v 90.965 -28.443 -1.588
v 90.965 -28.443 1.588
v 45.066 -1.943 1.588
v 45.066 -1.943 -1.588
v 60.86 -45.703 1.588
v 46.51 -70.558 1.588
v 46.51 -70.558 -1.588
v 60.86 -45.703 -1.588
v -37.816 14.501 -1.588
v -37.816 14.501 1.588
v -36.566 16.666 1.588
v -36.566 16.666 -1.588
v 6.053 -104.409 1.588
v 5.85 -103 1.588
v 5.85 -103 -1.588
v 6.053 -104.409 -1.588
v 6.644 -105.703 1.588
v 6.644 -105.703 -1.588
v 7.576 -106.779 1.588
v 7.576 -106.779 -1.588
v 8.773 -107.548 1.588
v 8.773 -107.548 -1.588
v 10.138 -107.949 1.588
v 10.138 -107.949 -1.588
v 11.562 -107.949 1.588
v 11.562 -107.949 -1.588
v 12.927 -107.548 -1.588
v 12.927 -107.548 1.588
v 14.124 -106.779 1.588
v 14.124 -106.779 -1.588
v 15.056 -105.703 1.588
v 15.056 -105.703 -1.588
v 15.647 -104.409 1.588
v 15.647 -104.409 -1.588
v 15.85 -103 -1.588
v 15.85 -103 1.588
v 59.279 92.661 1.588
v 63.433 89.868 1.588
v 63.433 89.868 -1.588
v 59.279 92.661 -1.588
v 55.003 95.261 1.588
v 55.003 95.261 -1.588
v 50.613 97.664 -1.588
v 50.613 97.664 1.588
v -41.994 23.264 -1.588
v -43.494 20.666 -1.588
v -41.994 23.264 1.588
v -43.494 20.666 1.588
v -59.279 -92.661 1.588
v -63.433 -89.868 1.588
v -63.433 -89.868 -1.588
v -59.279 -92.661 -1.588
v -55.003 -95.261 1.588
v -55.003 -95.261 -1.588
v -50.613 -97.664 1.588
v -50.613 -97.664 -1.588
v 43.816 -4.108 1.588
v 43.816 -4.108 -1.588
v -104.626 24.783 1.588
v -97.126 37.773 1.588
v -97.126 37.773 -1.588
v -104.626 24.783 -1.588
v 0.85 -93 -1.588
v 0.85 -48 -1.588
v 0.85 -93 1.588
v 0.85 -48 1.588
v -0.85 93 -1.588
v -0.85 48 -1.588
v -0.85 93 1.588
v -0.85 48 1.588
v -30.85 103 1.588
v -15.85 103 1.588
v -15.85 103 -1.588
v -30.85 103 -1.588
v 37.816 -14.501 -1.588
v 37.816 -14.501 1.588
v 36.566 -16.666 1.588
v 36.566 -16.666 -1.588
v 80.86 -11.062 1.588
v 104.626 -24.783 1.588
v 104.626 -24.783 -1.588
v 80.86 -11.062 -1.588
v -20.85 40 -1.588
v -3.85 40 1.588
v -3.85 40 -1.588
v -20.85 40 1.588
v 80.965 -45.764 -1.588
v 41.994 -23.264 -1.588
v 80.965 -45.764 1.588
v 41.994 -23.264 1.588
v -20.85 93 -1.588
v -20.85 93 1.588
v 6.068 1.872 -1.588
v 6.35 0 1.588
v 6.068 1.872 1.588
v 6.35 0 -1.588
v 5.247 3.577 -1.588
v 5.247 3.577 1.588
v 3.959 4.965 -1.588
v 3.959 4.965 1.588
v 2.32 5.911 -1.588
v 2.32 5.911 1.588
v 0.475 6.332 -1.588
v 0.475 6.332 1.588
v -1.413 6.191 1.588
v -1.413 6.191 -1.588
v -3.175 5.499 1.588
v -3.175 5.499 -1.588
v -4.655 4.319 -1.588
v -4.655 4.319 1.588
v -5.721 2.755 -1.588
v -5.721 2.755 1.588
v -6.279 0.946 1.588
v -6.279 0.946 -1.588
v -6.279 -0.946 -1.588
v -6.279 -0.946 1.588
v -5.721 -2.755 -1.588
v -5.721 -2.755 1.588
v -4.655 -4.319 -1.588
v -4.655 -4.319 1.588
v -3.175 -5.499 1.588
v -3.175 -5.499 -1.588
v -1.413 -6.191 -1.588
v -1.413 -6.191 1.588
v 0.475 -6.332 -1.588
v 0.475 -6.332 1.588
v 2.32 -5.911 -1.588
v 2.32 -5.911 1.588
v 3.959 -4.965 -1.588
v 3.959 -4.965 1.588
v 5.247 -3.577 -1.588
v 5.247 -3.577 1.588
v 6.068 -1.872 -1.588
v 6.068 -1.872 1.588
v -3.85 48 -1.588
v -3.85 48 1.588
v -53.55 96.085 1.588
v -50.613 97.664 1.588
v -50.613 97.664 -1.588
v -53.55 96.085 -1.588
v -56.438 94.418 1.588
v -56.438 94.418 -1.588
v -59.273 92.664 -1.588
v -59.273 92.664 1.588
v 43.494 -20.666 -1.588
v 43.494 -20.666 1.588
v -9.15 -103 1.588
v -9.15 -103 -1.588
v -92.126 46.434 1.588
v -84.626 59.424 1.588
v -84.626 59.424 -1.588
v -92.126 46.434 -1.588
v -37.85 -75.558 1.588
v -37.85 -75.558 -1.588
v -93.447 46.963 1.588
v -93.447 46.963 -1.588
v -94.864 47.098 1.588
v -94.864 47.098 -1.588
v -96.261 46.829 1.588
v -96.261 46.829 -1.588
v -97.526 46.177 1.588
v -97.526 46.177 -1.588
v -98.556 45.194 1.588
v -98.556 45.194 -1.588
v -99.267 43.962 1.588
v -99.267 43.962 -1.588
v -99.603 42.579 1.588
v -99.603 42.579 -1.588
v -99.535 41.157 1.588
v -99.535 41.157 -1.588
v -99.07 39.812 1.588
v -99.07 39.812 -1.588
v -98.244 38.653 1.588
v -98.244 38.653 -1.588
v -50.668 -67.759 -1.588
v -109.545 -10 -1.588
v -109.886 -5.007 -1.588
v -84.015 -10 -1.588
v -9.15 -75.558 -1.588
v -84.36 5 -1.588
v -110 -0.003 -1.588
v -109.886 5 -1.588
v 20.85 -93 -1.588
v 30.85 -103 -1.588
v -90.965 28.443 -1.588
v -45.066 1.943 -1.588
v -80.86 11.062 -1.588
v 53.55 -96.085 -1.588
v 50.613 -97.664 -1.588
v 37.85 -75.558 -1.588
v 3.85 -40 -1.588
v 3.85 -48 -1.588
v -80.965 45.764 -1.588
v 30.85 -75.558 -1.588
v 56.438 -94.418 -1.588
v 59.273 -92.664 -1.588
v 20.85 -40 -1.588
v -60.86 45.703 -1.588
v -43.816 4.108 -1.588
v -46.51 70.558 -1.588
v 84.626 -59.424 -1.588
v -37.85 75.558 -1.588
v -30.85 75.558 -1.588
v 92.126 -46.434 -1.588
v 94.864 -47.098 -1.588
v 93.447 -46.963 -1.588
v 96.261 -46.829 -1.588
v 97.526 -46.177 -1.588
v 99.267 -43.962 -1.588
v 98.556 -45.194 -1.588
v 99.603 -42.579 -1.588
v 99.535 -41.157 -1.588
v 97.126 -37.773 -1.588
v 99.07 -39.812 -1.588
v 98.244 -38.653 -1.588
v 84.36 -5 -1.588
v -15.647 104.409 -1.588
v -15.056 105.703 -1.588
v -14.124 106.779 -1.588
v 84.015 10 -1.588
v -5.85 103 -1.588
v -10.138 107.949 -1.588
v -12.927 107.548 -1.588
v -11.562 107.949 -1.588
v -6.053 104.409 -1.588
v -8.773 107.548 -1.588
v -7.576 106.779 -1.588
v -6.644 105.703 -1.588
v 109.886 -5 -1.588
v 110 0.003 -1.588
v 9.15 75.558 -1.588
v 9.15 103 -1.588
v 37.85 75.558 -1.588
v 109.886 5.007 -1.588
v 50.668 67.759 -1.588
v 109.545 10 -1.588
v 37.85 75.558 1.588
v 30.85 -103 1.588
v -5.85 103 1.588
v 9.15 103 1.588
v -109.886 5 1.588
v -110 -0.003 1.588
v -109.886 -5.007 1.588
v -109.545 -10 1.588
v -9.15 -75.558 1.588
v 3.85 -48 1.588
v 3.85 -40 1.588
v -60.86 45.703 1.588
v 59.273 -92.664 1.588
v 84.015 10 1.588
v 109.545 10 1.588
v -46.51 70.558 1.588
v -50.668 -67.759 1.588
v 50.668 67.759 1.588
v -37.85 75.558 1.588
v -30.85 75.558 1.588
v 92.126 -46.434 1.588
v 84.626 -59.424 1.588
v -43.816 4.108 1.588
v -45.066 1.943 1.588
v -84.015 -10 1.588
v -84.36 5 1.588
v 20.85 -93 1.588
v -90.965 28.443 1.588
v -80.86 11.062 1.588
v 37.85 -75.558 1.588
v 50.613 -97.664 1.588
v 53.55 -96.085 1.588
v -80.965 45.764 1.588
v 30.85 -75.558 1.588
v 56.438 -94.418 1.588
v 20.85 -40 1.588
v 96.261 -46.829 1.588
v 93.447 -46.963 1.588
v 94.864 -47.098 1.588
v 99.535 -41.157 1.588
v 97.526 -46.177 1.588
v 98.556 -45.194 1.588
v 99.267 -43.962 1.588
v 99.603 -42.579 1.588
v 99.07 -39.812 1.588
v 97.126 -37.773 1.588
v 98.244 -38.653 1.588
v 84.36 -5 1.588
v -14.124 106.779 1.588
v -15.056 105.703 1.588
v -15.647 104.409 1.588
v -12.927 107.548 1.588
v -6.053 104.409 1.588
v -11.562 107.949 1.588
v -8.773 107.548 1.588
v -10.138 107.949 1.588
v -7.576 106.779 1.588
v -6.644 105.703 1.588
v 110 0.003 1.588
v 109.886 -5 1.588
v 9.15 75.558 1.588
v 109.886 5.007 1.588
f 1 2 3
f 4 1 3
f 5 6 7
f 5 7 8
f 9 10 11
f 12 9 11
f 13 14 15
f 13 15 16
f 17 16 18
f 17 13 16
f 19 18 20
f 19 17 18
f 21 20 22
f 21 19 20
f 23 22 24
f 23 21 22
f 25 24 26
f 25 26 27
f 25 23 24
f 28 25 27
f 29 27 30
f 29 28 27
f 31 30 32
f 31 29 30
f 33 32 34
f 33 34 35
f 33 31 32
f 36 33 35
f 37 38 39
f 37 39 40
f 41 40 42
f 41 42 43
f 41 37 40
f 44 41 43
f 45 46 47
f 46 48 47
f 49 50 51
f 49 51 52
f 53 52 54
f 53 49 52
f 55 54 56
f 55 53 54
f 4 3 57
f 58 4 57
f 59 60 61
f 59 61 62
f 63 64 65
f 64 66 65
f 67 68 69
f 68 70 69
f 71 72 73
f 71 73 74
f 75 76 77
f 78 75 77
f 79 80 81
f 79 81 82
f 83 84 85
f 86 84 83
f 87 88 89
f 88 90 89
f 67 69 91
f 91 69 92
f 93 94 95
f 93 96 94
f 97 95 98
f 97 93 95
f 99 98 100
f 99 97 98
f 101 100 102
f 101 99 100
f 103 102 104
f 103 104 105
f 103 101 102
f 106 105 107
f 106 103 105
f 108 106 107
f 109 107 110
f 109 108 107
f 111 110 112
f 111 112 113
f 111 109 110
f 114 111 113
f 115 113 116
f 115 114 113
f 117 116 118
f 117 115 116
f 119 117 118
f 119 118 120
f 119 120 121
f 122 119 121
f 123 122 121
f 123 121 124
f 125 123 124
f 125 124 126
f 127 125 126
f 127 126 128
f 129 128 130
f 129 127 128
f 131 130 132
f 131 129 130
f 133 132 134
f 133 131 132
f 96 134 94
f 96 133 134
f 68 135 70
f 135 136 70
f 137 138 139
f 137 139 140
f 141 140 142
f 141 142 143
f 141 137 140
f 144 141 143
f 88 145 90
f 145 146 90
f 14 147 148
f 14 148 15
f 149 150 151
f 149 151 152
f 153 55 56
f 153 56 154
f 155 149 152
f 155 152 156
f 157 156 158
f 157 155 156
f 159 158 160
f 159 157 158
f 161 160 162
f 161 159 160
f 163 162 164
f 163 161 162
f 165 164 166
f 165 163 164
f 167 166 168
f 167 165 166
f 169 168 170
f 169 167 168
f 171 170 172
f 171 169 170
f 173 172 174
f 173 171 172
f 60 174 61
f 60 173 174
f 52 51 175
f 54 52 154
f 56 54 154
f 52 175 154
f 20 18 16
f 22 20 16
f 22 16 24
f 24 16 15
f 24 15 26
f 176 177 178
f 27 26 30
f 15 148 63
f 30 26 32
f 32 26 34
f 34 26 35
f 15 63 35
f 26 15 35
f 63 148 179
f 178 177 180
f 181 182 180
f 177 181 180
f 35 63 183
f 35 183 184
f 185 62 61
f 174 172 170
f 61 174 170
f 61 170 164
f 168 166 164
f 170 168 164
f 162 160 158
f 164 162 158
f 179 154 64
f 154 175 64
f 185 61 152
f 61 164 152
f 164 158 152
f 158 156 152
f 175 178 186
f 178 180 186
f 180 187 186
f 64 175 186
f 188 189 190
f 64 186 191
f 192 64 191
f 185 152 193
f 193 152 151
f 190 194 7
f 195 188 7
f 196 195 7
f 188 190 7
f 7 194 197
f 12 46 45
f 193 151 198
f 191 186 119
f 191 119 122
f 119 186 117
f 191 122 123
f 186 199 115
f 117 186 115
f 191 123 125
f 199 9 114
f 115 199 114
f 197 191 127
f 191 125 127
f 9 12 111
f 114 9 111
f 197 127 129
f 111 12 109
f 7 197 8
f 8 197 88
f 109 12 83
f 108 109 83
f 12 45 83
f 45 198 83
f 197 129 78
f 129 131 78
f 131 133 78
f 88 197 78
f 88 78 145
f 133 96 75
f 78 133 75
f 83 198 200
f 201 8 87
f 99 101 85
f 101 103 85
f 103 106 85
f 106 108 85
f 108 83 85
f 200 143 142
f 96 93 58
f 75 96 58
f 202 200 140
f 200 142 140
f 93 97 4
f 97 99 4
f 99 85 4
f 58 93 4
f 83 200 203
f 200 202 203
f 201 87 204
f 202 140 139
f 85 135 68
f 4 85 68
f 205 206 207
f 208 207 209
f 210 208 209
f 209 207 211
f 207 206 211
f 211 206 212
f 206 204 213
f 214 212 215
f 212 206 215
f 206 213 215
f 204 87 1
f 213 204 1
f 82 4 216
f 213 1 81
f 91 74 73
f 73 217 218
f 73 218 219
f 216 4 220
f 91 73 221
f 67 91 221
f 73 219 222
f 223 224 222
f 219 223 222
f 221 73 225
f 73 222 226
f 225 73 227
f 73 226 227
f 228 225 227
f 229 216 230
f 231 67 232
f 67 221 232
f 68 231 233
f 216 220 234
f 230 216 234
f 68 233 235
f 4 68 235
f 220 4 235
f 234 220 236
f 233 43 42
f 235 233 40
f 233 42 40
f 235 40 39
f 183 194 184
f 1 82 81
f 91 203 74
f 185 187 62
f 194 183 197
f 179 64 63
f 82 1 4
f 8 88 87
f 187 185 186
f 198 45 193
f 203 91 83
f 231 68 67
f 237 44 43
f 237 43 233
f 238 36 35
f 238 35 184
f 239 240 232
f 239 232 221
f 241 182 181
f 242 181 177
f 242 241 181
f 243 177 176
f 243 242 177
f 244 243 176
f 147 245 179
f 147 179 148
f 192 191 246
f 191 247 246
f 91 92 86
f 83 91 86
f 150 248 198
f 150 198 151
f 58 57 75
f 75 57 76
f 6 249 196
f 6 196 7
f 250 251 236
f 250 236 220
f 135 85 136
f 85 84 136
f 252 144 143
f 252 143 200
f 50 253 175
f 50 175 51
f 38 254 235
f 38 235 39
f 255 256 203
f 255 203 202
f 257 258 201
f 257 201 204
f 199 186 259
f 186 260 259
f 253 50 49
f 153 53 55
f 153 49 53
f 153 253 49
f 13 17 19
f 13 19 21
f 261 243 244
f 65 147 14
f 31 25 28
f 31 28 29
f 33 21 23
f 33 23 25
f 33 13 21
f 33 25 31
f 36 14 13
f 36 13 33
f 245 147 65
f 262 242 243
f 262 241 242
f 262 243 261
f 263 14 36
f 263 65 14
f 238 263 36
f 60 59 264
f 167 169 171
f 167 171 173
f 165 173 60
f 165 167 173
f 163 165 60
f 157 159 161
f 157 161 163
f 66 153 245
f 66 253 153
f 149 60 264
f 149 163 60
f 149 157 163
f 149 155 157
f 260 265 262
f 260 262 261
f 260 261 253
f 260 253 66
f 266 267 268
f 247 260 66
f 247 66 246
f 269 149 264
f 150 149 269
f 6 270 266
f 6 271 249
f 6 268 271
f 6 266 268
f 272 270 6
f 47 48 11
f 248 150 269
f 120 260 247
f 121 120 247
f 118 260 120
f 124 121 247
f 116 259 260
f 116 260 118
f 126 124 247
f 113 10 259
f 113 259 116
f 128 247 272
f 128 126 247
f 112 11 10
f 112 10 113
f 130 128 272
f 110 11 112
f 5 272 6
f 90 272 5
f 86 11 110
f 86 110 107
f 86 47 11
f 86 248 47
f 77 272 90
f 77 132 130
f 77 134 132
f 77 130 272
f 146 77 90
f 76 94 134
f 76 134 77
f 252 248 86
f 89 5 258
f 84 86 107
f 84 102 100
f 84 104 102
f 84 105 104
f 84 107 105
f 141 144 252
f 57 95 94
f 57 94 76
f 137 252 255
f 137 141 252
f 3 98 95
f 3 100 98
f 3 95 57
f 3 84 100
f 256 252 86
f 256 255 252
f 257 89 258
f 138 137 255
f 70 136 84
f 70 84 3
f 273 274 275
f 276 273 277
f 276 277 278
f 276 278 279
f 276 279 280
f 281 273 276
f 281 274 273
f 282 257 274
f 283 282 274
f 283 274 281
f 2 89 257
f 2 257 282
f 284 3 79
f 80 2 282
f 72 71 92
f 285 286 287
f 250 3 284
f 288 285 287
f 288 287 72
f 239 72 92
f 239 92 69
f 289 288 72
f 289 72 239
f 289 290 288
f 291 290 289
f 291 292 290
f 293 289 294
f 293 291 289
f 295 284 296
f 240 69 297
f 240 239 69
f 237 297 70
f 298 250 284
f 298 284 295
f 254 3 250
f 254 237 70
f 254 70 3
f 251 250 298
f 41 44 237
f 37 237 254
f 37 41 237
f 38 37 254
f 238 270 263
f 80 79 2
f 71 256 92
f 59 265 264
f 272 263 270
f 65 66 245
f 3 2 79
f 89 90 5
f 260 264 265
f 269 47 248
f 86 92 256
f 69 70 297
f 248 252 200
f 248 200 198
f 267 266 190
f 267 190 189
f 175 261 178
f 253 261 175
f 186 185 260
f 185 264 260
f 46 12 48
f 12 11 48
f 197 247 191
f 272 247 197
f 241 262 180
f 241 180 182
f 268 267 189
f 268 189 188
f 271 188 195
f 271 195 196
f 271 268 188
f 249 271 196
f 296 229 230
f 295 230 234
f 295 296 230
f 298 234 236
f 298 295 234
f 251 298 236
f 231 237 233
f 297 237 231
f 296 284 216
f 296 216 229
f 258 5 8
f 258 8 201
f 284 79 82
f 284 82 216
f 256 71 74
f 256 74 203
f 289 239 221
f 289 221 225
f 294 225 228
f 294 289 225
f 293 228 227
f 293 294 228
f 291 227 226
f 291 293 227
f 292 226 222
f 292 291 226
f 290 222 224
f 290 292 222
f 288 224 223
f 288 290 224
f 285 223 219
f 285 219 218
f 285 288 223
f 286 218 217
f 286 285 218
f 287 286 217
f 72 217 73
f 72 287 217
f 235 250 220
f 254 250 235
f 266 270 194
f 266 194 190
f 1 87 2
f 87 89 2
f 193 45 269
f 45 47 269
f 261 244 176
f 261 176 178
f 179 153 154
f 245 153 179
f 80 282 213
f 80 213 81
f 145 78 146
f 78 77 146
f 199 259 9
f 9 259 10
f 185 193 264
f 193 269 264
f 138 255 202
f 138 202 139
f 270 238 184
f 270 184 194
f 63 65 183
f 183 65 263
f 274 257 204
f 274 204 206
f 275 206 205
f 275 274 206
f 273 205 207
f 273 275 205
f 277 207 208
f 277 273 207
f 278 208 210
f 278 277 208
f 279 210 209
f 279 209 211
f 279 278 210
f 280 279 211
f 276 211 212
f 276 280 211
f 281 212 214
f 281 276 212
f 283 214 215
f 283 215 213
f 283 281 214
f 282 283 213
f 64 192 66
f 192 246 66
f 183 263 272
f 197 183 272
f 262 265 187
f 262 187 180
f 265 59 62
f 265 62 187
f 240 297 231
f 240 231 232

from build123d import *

# Parameters (mm, degrees)
SKETCH1_R                = 110
SKETCH1_R_2              = 6.35
BOSS_EXTRUDE1_DEPTH      = 1.5875
CUT_EXTRUDE3_DEPTH       = 156.595888844
CIRPATTERN1_COUNT        = 2
CIRPATTERN2_COUNT        = 2
CIRPATTERN2_ANGLE        = 60
CIRPATTERN2_COPY_1_DEPTH = 156.595888844
CUT_EXTRUDE5_DEPTH       = 155.188458145


with BuildPart() as part:
    # Sketch1 → Boss-Extrude1 (new, symmetric)
    with BuildSketch(Plane.XY):
        Circle(SKETCH1_R)
        Circle(SKETCH1_R_2, mode=Mode.SUBTRACT)
        Polygon((-6.35, 40), (-3.85, 40), (-3.85, 48), (-0.85, 48), (-0.85, 93), (-20.85, 93), (-20.85, 40), (-18.35, 40), align=None, mode=Mode.SUBTRACT)
        Polygon((6.35, -40), (3.85, -40), (3.85, -48), (0.85, -48), (0.85, -93), (20.85, -93), (20.85, -40), (18.35, -40), align=None, mode=Mode.SUBTRACT)
        Polygon((37.816016151, -14.500738686), (36.566016151, -16.665802195), (43.494219382, -20.665802195), (41.994219382, -23.263878407), (80.965362552, -45.763878407), (90.965362552, -28.443370331), (45.066016151, -1.943370331), (43.816016151, -4.108433841), align=None, mode=Mode.SUBTRACT)
        Polygon((-37.816016151, 14.500738686), (-36.566016151, 16.665802195), (-43.494219382, 20.665802195), (-41.994219382, 23.263878407), (-80.965362552, 45.763878407), (-90.965362552, 28.443370331), (-45.066016151, 1.943370331), (-43.816016151, 4.108433841), align=None, mode=Mode.SUBTRACT)
    extrude(amount=BOSS_EXTRUDE1_DEPTH, both=True)

    # Sketch2 → Cut-Extrude3 (cut, through all)
    with BuildSketch(Plane.XY.offset(1.5875)):
        with BuildLine():
            Line((-50.613025421, -97.664331553), (-37.85, -75.558123066))
            Line((-37.85, -75.558123066), (-9.15, -75.558123066))
            Line((-9.15, -75.558123066), (-9.15, -103))
            Line((-9.15, -103), (5.85, -103))
            ThreePointArc((5.85, -103), (10.85, -108), (15.85, -103))
            Line((15.85, -103), (30.85, -103))
            Line((30.85, -103), (30.85, -75.558123066))
            Line((30.85, -75.558123066), (37.85, -75.558123066))
            Line((37.85, -75.558123066), (50.613025421, -97.664331553))
            ThreePointArc((50.613025421, -97.664331553), (0, -110), (-50.613025421, -97.664331553))
        make_face()
    cut_extrude3 = extrude(amount=-CUT_EXTRUDE3_DEPTH, mode=Mode.SUBTRACT)

    # CirPattern1: Cut-Extrude3 ×2 about axis
    cirpattern1_axis = Axis((0, 0, 0), (0, 0, 1))
    for i in range(1, CIRPATTERN1_COUNT):
        add(cut_extrude3.rotate(cirpattern1_axis, i * 360 / CIRPATTERN1_COUNT), mode=Mode.SUBTRACT)

    # CirPattern2: Cut-Extrude3 ×2 about axis
    cirpattern2_axis = Axis((0, 0, 0), (0, 0, 1))
    for i in range(1, CIRPATTERN2_COUNT):
        add(cut_extrude3.rotate(cirpattern2_axis, i * CIRPATTERN2_ANGLE / (CIRPATTERN2_COUNT - 1)), mode=Mode.SUBTRACT)

    # CirPattern2 copy 1 sketch → CirPattern2 copy 1 (cut, through all)
    with BuildSketch(Plane(origin=(0, 0, 1.5875), x_dir=(-0.4999999999999979, -0.8660254037844398, 0), z_dir=(0, 0, 1))):
        with BuildLine():
            Line((-50.613025421, -97.664331553), (-37.85, -75.558123066))
            Line((-37.85, -75.558123066), (-9.15, -75.558123066))
            Line((-9.15, -75.558123066), (-9.15, -103))
            Line((-9.15, -103), (5.85, -103))
            ThreePointArc((5.85, -103), (10.85, -108), (15.85, -103))
            Line((15.85, -103), (30.85, -103))
            Line((30.85, -103), (30.85, -75.558123066))
            Line((30.85, -75.558123066), (37.85, -75.558123066))
            Line((37.85, -75.558123066), (50.613025421, -97.664331553))
            ThreePointArc((50.613025421, -97.664331553), (0, -110), (-50.613025421, -97.664331553))
        make_face()
    extrude(amount=-CIRPATTERN2_COPY_1_DEPTH, mode=Mode.SUBTRACT)

    # Sketch5 → Cut-Extrude5 (cut, through all)
    with BuildSketch(Plane.XY.offset(1.5875)):
        with BuildLine():
            Line((-109.544511501, -10), (-84.014511501, -10))
            Line((-84.014511501, -10), (-50.667509788, -67.758701246))
            Line((-50.667509788, -67.758701246), (-63.432509788, -89.868329805))
            ThreePointArc((-63.432509788, -89.868329805), (-95.262794416, -55), (-109.544511501, -10))
        make_face()
        with BuildLine():
            Line((109.544511501, 10), (84.014511501, 10))
            Line((84.014511501, 10), (50.667509788, 67.758701246))
            Line((50.667509788, 67.758701246), (63.432509788, 89.868329805))
            ThreePointArc((63.432509788, 89.868329805), (95.262794416, 55), (109.544511501, 10))
        make_face()
    extrude(amount=-CUT_EXTRUDE5_DEPTH, mode=Mode.SUBTRACT)


solid = part.part
